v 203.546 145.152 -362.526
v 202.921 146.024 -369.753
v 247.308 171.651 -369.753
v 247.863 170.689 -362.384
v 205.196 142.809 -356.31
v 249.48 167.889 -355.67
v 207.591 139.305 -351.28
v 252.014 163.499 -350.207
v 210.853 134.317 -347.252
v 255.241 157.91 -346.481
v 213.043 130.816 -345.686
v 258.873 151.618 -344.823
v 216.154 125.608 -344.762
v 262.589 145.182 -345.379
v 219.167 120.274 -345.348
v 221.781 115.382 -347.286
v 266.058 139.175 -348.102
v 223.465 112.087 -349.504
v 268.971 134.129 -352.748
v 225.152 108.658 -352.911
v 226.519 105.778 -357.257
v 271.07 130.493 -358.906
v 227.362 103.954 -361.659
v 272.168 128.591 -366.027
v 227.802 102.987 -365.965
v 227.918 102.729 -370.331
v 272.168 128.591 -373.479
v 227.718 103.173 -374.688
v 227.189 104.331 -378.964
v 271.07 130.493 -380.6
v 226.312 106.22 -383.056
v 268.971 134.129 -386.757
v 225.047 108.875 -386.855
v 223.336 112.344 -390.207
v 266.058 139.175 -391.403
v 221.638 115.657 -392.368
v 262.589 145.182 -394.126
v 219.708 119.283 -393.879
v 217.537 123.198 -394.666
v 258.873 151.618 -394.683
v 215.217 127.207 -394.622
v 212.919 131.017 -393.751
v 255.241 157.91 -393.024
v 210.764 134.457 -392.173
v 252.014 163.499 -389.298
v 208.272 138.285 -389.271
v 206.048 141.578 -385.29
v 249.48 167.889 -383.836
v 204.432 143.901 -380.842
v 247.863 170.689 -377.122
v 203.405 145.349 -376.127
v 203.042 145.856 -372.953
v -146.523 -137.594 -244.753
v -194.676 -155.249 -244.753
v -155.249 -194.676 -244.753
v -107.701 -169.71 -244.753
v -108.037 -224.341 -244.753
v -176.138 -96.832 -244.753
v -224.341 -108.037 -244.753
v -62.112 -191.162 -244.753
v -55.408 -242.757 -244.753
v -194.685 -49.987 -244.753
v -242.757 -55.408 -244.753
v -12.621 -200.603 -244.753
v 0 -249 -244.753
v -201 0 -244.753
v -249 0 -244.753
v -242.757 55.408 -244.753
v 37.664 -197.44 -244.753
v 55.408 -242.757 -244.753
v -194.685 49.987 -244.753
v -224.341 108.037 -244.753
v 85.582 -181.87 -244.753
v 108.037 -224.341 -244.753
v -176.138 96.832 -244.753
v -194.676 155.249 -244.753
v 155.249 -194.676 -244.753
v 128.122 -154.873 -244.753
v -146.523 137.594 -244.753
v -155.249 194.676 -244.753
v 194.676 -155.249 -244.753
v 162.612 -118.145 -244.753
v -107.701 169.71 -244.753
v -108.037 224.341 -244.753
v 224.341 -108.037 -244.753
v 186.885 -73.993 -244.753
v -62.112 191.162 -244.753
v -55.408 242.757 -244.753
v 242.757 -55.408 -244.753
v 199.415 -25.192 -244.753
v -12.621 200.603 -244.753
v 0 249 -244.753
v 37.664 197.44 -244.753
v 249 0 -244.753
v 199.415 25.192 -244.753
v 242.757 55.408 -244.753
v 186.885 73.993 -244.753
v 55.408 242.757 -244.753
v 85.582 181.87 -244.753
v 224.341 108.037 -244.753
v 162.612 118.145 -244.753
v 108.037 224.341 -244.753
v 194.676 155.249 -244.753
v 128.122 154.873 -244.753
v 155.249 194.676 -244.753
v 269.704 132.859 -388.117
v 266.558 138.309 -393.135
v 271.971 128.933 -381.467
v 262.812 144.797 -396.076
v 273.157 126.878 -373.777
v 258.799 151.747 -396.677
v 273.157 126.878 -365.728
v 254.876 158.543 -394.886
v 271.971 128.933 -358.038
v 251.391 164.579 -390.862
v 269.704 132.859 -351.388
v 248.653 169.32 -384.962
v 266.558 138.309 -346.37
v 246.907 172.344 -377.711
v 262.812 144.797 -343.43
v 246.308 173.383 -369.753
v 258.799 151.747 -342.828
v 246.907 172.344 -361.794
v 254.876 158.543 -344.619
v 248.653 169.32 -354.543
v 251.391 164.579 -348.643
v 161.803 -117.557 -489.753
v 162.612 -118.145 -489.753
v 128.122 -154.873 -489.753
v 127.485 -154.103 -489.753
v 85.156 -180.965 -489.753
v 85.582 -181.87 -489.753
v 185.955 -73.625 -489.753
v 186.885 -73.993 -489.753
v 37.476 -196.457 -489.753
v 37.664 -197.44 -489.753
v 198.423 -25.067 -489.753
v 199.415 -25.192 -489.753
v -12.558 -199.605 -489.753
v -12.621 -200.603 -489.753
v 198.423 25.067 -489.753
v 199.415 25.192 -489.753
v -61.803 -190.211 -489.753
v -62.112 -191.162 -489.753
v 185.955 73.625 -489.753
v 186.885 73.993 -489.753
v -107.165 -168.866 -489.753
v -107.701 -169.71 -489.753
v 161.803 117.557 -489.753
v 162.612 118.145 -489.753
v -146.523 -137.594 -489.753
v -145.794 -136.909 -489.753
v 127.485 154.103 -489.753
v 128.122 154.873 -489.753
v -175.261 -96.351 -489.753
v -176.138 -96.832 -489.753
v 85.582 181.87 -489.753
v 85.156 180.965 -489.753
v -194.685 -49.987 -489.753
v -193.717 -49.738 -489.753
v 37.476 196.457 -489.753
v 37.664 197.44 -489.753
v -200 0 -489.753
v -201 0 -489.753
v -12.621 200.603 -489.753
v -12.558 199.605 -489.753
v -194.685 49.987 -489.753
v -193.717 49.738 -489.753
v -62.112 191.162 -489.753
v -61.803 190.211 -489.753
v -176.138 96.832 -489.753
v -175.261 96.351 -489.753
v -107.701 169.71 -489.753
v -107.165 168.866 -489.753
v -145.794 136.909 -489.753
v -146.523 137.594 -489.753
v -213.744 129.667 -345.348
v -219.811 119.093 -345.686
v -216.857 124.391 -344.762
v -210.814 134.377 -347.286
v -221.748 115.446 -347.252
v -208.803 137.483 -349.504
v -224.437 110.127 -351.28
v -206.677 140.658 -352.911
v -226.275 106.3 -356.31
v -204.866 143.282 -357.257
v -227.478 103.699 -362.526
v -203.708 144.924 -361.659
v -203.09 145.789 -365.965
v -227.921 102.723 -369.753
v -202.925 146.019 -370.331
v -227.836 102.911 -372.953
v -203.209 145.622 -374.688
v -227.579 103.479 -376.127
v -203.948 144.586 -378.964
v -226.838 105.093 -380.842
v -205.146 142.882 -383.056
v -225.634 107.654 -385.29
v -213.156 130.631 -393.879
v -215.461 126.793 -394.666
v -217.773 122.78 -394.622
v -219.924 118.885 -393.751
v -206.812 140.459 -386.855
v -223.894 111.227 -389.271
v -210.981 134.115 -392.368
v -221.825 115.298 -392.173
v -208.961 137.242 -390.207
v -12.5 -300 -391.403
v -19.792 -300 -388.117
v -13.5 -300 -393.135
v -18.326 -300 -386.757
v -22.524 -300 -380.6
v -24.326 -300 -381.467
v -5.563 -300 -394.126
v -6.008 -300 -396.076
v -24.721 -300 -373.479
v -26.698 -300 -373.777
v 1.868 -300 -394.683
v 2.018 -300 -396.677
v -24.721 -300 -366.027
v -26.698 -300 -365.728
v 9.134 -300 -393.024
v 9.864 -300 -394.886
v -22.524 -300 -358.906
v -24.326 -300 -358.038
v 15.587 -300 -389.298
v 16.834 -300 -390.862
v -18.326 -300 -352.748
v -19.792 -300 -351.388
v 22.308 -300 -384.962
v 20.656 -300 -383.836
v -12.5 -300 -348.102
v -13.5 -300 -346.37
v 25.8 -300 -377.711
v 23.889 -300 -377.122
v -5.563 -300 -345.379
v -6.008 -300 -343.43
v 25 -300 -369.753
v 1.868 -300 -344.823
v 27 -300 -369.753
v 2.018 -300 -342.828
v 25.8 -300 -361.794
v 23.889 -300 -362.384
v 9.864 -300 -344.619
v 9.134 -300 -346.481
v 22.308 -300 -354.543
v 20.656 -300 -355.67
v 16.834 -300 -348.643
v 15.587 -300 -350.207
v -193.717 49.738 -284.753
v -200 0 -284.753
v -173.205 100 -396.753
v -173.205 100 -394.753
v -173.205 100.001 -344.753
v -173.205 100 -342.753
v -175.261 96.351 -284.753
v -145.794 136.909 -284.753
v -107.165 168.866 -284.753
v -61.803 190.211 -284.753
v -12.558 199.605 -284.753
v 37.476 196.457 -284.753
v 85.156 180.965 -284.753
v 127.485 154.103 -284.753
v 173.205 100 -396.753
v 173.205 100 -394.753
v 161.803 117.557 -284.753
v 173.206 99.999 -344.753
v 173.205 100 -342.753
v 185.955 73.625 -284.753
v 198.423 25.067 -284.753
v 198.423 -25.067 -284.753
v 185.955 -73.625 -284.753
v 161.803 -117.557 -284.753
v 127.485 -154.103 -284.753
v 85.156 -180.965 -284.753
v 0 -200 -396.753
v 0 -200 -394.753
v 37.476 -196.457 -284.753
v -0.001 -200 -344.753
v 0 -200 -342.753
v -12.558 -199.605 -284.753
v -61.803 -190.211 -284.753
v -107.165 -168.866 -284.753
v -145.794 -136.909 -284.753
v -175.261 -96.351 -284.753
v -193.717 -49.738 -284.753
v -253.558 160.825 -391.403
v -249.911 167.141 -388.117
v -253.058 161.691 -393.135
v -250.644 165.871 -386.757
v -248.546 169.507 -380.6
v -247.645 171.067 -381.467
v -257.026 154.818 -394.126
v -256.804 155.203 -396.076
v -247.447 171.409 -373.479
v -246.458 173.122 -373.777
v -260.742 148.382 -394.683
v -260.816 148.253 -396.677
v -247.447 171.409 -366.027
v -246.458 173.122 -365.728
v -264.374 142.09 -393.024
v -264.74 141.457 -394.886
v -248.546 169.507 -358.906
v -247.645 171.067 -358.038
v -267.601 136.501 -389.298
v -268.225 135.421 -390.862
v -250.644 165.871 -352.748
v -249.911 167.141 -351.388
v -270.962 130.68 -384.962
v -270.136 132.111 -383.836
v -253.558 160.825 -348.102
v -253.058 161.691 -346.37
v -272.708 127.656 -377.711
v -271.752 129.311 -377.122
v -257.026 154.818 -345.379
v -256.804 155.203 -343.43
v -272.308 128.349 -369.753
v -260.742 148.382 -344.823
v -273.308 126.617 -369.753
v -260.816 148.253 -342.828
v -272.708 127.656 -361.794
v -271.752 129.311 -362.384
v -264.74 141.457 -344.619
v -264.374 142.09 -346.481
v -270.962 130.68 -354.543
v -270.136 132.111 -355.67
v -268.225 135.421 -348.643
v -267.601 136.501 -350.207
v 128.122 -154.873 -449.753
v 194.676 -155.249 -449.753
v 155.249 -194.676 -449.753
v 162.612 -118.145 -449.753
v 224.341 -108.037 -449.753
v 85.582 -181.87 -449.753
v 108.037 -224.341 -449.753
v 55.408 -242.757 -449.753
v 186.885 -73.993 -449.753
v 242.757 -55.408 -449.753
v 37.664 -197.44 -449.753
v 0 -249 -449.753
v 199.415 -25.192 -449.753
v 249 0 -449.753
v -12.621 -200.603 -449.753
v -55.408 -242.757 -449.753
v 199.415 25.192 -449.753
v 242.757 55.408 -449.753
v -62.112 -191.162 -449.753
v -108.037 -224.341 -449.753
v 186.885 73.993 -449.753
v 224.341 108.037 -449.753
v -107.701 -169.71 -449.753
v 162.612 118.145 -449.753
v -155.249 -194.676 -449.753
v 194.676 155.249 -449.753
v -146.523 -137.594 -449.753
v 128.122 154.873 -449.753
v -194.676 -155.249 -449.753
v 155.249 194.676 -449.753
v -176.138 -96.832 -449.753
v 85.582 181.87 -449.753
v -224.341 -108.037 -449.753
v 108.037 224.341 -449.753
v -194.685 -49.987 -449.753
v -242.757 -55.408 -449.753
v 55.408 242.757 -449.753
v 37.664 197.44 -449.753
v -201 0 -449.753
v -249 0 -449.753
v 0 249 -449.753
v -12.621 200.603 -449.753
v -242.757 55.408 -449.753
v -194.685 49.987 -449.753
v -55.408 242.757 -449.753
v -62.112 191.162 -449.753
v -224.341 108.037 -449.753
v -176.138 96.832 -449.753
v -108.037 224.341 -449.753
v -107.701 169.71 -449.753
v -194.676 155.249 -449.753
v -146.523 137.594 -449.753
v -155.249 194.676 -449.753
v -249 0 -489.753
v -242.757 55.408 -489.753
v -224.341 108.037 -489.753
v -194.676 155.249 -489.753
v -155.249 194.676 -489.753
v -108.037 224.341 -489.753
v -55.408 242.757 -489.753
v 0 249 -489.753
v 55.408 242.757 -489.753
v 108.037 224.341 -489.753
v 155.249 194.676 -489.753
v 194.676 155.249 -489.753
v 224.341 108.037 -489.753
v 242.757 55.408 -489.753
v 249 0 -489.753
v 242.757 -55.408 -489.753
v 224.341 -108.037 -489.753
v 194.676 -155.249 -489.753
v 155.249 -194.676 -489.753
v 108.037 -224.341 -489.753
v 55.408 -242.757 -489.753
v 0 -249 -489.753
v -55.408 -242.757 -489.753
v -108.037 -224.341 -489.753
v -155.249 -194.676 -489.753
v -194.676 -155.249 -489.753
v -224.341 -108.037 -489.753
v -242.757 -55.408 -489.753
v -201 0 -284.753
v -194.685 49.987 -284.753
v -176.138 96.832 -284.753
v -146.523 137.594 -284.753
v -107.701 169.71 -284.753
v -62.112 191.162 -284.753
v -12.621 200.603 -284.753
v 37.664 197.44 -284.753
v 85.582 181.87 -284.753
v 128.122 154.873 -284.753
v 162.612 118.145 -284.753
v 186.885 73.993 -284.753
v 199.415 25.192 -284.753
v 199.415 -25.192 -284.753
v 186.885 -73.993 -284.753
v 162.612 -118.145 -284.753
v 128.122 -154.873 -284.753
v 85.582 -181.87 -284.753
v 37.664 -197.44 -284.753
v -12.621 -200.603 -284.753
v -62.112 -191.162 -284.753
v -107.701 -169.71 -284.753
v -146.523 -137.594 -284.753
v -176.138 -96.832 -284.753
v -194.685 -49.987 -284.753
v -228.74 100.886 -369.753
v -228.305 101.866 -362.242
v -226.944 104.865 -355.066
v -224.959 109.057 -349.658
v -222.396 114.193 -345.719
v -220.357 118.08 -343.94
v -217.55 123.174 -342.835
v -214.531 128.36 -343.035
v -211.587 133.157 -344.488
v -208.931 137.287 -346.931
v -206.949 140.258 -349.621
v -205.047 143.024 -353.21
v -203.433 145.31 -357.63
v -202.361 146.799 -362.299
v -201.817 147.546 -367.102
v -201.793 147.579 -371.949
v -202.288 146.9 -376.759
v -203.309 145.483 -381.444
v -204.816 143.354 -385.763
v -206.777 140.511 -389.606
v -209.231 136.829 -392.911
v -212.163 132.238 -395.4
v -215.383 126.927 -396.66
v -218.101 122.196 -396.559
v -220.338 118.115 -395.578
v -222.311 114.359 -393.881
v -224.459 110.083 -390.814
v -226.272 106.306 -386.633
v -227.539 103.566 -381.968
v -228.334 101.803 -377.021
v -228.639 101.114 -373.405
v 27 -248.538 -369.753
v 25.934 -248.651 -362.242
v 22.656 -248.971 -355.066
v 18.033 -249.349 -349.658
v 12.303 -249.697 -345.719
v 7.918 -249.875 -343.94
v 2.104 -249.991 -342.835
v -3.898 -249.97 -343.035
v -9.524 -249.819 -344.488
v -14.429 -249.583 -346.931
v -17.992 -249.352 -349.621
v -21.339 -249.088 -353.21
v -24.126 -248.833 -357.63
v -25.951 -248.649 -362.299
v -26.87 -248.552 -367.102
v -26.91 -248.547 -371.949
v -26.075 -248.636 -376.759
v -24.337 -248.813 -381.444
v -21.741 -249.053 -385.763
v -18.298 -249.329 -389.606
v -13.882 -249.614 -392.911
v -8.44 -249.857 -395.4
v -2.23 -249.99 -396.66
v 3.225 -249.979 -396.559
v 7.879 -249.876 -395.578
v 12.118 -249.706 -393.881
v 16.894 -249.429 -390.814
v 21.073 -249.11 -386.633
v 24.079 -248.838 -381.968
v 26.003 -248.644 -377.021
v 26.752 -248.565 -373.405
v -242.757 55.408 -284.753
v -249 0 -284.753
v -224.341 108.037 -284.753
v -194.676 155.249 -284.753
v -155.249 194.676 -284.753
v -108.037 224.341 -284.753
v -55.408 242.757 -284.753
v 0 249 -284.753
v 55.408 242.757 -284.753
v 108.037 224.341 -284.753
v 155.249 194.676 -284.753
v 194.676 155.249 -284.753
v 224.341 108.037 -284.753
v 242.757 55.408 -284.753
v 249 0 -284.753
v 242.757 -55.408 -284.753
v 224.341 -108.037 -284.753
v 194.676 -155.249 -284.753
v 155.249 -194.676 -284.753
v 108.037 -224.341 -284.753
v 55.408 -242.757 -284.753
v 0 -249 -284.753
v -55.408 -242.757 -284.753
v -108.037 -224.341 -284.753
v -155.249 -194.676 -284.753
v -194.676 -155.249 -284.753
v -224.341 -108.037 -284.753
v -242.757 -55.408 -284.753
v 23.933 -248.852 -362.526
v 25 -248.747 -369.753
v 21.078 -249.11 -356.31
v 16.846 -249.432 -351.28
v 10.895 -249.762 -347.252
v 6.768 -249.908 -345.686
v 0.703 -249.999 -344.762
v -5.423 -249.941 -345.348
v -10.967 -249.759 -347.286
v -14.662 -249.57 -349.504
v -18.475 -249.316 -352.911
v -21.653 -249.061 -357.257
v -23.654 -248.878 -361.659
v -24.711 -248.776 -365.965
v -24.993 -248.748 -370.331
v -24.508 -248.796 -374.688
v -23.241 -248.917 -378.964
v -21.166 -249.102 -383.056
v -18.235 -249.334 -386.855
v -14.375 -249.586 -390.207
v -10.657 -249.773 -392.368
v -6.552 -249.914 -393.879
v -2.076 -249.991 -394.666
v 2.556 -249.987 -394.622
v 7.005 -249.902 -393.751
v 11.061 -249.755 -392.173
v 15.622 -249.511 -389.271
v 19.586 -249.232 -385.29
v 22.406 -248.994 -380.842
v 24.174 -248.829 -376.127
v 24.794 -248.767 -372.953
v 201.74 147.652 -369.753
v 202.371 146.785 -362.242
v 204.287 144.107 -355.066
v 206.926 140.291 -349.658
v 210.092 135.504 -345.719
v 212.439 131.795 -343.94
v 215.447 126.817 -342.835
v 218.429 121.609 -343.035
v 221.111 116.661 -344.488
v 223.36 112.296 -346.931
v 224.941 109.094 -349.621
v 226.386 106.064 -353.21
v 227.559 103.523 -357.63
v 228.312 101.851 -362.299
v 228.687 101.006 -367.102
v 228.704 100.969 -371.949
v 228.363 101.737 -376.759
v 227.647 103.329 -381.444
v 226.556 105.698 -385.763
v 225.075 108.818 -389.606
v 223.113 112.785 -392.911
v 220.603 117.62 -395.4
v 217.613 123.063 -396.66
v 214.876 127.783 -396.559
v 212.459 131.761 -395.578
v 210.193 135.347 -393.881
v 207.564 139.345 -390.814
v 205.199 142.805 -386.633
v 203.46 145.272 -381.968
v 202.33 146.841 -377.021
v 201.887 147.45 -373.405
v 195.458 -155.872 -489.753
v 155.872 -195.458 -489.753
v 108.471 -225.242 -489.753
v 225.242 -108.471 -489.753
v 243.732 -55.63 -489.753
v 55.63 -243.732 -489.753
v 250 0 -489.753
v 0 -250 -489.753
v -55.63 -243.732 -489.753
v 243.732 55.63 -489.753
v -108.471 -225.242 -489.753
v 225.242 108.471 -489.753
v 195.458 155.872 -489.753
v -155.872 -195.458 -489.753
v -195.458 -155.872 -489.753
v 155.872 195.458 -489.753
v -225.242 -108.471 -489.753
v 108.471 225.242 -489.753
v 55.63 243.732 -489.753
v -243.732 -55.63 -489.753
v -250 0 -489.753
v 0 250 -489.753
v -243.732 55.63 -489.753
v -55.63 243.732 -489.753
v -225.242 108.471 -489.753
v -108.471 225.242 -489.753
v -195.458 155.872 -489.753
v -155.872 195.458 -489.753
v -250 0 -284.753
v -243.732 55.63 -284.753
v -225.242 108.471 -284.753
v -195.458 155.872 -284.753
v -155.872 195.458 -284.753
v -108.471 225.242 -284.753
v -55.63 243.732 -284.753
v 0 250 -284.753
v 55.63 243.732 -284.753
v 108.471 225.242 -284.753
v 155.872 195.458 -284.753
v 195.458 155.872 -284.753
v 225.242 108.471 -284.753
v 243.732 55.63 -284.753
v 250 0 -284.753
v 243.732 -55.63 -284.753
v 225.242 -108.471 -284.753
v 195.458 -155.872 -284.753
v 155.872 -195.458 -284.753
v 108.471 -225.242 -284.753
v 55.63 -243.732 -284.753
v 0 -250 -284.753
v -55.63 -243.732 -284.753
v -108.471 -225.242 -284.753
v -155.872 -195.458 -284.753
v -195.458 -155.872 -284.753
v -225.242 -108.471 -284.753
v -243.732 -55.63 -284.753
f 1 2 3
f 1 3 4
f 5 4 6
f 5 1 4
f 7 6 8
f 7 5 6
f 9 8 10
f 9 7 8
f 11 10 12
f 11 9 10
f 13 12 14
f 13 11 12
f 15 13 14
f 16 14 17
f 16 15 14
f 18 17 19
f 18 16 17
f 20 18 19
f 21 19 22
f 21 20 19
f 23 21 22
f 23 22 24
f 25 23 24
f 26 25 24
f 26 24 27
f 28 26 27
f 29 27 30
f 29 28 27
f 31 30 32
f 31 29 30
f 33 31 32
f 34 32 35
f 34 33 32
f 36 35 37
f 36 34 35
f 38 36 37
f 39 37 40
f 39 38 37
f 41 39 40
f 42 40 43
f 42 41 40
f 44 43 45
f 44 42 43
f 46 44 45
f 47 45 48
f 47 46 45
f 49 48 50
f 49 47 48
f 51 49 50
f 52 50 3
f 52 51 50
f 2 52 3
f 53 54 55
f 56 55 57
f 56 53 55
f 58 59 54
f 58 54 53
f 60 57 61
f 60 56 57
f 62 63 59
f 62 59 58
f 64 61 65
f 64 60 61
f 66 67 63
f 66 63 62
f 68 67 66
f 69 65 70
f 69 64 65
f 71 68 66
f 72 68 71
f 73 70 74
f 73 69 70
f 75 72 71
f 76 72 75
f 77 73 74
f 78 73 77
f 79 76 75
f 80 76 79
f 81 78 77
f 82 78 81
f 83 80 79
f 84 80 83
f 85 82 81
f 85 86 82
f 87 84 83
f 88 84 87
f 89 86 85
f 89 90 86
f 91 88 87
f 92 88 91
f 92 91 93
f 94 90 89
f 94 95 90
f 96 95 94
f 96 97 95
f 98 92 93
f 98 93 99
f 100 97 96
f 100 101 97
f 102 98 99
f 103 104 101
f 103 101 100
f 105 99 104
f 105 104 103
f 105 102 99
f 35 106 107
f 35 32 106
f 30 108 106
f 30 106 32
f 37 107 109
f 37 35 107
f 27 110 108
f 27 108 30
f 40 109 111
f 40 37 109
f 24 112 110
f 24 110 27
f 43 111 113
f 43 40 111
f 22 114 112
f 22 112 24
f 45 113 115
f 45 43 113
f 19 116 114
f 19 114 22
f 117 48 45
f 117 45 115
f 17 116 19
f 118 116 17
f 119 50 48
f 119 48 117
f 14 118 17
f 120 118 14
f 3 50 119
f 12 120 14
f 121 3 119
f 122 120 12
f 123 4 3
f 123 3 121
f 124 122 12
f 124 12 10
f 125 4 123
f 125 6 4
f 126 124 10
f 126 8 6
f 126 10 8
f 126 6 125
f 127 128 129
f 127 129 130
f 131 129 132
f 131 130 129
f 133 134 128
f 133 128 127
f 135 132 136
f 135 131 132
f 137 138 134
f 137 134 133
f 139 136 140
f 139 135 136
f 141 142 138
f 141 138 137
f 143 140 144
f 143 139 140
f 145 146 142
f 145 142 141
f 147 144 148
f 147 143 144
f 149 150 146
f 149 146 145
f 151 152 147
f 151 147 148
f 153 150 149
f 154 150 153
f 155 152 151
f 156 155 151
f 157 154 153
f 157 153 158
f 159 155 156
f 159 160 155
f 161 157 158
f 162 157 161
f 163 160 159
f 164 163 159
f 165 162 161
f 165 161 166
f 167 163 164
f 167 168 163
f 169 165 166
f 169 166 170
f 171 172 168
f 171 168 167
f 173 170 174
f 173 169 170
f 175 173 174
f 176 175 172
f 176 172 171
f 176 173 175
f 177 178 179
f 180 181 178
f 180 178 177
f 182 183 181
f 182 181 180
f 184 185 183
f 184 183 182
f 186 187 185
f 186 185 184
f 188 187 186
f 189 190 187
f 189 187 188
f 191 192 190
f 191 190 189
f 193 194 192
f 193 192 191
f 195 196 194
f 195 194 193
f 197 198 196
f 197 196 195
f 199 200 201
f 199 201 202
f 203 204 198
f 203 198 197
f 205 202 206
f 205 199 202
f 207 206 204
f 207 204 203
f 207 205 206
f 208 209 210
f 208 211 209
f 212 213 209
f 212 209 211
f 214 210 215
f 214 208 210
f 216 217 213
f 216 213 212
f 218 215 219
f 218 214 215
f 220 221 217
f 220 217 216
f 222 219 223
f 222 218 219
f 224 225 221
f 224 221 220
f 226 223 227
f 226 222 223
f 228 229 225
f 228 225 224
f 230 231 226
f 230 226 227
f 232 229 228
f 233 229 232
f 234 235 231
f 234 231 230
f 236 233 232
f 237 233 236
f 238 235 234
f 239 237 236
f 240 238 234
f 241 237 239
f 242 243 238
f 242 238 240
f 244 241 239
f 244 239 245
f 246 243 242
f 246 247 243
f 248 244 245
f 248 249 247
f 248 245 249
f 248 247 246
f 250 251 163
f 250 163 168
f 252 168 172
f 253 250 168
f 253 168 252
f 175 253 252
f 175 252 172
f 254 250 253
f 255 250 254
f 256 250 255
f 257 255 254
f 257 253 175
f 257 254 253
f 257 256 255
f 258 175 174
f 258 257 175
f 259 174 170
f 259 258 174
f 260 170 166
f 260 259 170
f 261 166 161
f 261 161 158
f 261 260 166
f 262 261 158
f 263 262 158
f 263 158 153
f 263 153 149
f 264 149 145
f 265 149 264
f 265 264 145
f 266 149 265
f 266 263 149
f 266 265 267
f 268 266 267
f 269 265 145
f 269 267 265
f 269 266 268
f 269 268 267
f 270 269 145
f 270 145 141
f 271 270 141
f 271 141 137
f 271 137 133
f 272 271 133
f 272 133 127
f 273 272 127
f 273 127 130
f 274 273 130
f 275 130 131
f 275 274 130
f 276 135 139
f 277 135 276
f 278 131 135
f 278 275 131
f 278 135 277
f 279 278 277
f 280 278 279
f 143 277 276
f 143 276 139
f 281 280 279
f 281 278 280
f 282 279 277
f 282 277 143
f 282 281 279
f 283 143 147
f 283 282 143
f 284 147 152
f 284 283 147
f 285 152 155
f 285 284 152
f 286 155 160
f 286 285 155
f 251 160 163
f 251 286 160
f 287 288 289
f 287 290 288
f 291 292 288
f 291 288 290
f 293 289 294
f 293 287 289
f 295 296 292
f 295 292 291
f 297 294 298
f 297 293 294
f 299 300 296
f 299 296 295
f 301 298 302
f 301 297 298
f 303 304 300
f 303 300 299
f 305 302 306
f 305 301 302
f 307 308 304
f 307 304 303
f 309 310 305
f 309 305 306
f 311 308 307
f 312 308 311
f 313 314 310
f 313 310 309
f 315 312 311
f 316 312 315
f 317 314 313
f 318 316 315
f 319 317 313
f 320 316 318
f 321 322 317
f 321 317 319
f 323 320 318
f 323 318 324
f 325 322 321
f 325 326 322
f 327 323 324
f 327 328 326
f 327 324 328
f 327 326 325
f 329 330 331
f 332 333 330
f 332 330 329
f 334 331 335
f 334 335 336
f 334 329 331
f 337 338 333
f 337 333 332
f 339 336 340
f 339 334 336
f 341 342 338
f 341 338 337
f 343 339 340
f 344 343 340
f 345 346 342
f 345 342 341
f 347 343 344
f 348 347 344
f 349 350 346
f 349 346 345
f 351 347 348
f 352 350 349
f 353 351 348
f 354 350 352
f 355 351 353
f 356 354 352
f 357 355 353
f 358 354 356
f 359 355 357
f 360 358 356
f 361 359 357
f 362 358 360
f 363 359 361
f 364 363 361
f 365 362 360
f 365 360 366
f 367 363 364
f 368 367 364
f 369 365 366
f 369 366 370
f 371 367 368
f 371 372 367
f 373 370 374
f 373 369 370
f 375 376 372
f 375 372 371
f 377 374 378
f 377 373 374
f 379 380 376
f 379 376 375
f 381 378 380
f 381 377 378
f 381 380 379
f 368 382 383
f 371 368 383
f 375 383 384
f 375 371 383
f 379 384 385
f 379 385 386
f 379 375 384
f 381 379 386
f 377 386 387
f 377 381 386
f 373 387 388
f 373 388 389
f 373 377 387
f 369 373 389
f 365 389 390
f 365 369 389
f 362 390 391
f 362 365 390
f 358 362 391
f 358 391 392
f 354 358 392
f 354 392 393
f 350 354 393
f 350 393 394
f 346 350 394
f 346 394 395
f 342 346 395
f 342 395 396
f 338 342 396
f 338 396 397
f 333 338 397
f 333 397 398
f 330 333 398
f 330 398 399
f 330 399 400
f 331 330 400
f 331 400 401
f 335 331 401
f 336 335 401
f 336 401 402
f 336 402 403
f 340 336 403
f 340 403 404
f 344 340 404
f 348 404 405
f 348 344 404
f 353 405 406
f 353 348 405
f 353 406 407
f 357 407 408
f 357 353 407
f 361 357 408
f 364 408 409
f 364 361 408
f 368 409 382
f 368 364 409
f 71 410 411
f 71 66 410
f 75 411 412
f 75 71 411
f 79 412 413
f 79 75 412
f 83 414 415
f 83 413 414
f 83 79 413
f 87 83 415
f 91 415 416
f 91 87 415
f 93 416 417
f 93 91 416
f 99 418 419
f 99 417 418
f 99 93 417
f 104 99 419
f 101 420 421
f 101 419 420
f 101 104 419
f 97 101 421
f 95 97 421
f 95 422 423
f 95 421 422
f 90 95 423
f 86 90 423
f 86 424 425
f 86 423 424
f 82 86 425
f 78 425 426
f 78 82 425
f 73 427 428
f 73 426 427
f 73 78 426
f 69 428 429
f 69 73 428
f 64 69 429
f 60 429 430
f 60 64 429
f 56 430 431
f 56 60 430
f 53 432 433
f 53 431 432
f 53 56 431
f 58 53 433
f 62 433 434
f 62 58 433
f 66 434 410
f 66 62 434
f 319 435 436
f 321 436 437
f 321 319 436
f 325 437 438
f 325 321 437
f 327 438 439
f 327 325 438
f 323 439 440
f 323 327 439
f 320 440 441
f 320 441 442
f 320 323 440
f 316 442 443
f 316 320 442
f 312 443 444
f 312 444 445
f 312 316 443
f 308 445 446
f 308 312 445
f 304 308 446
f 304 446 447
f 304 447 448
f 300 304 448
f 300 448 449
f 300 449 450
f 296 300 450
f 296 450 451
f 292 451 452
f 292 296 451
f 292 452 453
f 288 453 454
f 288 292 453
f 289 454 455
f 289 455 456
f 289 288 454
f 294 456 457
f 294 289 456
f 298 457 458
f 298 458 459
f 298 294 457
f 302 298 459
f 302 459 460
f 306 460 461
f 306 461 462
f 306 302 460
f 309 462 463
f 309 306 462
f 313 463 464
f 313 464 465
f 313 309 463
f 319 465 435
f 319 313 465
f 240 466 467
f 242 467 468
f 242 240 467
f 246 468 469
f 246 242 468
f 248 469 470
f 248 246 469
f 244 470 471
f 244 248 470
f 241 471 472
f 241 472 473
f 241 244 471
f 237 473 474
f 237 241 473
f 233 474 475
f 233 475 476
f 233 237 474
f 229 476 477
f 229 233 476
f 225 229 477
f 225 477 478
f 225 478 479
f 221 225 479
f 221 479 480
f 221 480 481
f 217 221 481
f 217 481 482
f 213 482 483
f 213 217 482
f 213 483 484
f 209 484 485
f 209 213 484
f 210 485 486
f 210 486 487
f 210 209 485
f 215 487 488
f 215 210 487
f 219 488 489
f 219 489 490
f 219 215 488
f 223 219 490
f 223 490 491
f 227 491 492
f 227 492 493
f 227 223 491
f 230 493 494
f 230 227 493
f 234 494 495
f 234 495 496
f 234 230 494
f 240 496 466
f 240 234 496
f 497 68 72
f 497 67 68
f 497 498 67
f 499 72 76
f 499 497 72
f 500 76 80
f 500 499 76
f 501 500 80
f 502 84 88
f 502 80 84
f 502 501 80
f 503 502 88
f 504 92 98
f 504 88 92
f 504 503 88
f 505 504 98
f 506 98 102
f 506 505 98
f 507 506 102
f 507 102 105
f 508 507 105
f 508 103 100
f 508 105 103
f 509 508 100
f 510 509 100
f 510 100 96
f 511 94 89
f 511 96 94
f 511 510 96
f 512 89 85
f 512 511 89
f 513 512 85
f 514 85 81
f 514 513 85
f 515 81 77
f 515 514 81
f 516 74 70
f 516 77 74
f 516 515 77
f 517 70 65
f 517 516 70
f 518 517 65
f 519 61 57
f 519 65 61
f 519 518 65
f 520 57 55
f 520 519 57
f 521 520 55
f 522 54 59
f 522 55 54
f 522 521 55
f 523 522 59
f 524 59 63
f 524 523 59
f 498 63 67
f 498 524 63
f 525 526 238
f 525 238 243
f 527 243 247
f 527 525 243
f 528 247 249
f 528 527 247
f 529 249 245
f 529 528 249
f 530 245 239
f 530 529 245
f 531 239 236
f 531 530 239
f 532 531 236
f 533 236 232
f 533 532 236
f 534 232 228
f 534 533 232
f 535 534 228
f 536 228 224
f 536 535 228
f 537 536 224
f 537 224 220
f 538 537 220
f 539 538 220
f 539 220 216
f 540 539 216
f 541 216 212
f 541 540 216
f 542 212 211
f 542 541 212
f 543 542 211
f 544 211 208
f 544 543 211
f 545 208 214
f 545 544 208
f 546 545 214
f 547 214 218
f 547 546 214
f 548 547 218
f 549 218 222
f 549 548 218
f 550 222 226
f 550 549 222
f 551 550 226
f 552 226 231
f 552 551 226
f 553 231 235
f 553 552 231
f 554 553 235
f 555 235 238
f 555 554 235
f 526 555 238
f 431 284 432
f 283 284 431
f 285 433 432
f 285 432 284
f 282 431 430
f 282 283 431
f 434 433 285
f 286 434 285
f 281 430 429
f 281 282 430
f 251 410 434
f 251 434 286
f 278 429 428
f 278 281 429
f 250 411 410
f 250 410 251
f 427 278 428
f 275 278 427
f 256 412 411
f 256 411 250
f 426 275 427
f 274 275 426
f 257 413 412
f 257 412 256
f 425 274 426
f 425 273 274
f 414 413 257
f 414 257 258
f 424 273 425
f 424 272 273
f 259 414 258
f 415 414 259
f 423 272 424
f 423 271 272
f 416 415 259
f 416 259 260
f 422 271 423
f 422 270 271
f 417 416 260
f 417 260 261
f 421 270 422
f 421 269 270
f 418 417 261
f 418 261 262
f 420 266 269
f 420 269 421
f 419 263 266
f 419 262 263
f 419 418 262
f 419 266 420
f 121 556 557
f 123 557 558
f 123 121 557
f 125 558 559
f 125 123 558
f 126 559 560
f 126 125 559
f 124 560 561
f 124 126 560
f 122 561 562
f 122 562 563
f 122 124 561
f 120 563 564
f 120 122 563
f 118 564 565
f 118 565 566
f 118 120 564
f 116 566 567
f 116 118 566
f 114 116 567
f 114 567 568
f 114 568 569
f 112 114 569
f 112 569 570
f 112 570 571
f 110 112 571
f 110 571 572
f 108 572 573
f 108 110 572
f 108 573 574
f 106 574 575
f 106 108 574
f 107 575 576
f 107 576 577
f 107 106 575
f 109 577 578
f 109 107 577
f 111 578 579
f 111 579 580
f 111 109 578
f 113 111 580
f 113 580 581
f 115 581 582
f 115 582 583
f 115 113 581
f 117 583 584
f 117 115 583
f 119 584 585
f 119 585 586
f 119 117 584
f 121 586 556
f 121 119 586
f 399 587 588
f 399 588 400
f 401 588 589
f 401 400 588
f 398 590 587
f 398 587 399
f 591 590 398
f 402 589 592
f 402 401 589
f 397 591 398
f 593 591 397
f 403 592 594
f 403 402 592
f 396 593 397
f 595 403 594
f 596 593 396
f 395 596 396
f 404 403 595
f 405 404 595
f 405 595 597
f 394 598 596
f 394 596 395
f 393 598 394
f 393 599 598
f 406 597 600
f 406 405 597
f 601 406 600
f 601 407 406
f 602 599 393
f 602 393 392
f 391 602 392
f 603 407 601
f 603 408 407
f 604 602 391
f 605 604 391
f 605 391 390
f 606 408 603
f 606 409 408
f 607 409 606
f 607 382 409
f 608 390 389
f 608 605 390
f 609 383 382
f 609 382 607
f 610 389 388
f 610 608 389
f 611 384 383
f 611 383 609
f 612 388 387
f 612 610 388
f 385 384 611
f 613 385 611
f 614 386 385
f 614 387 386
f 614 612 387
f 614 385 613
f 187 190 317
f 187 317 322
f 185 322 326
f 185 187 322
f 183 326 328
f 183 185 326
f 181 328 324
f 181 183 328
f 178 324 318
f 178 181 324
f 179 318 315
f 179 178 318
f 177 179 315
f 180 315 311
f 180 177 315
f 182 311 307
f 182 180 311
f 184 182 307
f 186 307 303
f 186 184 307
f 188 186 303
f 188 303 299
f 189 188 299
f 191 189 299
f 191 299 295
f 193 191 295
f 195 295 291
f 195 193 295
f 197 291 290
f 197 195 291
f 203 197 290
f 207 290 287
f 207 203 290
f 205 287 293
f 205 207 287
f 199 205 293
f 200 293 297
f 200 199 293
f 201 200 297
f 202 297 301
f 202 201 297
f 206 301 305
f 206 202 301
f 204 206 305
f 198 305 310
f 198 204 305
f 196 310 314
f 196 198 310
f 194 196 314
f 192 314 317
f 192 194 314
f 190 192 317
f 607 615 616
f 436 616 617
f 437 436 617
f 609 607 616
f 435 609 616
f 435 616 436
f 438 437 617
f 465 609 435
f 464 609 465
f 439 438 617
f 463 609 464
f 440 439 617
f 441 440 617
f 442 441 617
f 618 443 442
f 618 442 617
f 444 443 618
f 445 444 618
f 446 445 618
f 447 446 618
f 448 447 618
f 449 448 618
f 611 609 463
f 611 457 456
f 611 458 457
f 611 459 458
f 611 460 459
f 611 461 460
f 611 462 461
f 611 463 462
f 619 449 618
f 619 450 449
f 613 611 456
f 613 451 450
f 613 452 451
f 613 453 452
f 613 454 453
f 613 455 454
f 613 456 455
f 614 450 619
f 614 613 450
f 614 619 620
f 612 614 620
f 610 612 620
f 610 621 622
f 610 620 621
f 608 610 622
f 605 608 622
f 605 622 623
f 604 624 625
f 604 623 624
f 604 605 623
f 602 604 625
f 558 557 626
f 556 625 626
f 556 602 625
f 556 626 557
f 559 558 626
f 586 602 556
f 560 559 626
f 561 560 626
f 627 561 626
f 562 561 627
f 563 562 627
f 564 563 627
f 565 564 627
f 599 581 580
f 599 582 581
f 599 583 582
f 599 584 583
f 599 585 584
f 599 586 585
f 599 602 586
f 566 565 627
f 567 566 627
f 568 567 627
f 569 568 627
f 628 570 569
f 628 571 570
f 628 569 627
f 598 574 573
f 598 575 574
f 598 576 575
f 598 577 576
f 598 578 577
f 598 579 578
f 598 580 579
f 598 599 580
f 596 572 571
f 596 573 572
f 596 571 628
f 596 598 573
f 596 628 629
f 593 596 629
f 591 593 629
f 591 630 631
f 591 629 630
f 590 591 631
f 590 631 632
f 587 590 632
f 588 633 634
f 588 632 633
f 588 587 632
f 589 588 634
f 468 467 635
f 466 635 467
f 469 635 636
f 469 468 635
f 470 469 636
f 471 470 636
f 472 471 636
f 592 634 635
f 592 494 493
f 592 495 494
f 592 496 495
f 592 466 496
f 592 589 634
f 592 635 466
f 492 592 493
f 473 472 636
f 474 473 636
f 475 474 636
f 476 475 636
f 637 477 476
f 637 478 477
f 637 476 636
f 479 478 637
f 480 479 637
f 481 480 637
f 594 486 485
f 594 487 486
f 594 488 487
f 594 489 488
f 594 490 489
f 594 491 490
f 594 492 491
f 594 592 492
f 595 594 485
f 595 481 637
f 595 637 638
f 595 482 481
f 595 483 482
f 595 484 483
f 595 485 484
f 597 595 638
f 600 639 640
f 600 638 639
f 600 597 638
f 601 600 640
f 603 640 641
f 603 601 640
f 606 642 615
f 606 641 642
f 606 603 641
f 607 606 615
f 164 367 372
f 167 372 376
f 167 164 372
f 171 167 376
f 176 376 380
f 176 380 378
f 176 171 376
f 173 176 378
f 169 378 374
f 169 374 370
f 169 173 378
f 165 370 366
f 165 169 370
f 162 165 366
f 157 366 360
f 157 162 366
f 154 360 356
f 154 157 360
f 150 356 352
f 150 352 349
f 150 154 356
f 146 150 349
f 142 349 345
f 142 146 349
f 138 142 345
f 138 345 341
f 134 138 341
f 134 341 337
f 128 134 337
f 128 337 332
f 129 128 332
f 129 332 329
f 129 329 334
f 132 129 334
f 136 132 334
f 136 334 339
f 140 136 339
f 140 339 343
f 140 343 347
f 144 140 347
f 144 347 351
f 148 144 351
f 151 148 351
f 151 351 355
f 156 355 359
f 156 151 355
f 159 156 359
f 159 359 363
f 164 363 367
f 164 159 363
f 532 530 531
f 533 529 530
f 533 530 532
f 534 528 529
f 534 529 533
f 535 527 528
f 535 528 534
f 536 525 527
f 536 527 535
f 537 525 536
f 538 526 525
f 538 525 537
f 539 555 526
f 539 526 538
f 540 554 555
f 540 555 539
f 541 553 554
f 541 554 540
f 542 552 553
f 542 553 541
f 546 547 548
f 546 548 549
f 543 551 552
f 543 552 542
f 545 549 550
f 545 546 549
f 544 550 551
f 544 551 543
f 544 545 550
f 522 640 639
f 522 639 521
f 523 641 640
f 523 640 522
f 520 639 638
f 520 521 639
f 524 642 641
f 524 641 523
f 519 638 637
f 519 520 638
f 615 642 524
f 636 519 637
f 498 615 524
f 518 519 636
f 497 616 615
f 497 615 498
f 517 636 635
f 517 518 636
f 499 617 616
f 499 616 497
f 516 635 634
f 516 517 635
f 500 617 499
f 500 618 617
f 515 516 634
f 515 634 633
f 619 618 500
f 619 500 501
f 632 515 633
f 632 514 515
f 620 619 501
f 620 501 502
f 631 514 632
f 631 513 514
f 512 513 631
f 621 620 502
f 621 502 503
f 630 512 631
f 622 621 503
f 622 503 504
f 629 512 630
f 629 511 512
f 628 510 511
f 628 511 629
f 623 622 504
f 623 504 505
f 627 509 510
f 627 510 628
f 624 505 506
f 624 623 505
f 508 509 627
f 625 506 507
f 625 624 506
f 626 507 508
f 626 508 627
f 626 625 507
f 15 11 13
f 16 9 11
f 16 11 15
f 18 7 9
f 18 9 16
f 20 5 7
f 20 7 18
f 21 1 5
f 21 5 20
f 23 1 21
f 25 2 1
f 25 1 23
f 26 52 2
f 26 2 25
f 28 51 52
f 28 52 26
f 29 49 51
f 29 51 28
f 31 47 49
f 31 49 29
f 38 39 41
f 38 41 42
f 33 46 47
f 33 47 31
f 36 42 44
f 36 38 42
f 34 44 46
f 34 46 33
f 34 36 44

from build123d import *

# Parameters (mm, degrees)
F2_R     = 25
F3_DEPTH = 661
F5_R     = 27
F5_R_2   = 25
F6_DEPTH = 50
F7_COUNT = 3


with BuildPart() as f1:
    # F0 (on Front) → F1 (revolve)
    with BuildSketch(Plane.XZ):
        Polygon((-201, -489.7526234735), (-200, -489.7526234735), (-200, -284.7526234735), (-201, -284.7526234735), (-201, -244.7526234735), (-249, -244.7526234735), (-249, -284.7526234735), (-250, -284.7526234735), (-250, -489.7526234735), (-249, -489.7526234735), (-249, -449.7526234735), (-201, -449.7526234735), align=None)
    revolve(axis=Axis((0, 0, -77.0492781825), (0, 0, -1)))

    # F2 (on Front) → F3 (cut)
    with BuildSketch(Plane.XZ):
        with Locations((0, -369.7526234735)):
            Circle(F2_R)
    extrude(amount=F3_DEPTH, mode=Mode.SUBTRACT)

    # F5 (on offset) → F6 (join, symmetric)
    with BuildSketch(Plane.XZ.offset(250)):
        with Locations((0, -369.7526234735)):
            Circle(F5_R)
        with Locations((0, -369.7526234735)):
            Circle(F5_R_2, mode=Mode.SUBTRACT)
    extrude(amount=F6_DEPTH, both=True)

    # F7: F1 ×3 about axis
    f7_axis = Axis((0, 0, -369.7526234735), (0, 0, -1))


with BuildPart() as f1_1:
    add(f1.part)
    for i in range(1, F7_COUNT):
        add(f1.part.rotate(f7_axis, i * 360 / F7_COUNT))


solid = f1_1.part
